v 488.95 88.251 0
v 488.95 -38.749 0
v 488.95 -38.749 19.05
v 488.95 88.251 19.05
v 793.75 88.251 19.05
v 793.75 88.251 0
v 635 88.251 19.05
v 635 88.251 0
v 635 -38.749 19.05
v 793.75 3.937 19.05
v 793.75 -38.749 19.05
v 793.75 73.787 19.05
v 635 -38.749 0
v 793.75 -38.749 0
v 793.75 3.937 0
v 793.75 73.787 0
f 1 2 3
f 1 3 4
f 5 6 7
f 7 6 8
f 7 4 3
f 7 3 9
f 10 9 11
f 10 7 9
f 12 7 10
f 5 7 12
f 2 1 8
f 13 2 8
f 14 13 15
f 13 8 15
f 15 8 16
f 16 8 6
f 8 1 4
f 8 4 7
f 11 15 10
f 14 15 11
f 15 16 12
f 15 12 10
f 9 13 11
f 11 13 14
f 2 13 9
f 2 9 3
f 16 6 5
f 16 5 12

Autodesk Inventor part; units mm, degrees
ref_plane "YZ Plane" through (0, 0, 0) normal (1, 0, 0) x (0, 1, 0)
ref_plane "XZ Plane" through (0, 0, 0) normal (0, 1, 0) x (-1, 0, 0)
ref_plane "XY Plane" through (0, 0, 0) normal (0, 0, 1) x (1, 0, 0)
sketch "Sketch1" plane through (0, 0, 0) normal (0, 0, 1) x (1, 0, 0)
  line L0 (793.75, 73.787) -> (793.75, 3.937) projected
  line L1 (635, -38.7488) -> (793.75, -38.7488) projected
  line L2 (793.75, 88.2512) -> (635, 88.2512) projected
  line L3 (793.75, -38.7488) -> (488.95, -38.7488)
  line L4 (488.95, -38.7488) -> (488.95, 88.2512)
  line L5 (488.95, 88.2512) -> (793.75, 88.2512)
  line L6 (793.75, 88.2512) -> (793.75, -38.7488)
  point P0 (0, 0)
  dimension "d0" = 127
  dimension "d1" = 304.8
extrude "Extrusion1" add sketch "Sketch1" along normal blind 19.05
properties part number "Front Board"
